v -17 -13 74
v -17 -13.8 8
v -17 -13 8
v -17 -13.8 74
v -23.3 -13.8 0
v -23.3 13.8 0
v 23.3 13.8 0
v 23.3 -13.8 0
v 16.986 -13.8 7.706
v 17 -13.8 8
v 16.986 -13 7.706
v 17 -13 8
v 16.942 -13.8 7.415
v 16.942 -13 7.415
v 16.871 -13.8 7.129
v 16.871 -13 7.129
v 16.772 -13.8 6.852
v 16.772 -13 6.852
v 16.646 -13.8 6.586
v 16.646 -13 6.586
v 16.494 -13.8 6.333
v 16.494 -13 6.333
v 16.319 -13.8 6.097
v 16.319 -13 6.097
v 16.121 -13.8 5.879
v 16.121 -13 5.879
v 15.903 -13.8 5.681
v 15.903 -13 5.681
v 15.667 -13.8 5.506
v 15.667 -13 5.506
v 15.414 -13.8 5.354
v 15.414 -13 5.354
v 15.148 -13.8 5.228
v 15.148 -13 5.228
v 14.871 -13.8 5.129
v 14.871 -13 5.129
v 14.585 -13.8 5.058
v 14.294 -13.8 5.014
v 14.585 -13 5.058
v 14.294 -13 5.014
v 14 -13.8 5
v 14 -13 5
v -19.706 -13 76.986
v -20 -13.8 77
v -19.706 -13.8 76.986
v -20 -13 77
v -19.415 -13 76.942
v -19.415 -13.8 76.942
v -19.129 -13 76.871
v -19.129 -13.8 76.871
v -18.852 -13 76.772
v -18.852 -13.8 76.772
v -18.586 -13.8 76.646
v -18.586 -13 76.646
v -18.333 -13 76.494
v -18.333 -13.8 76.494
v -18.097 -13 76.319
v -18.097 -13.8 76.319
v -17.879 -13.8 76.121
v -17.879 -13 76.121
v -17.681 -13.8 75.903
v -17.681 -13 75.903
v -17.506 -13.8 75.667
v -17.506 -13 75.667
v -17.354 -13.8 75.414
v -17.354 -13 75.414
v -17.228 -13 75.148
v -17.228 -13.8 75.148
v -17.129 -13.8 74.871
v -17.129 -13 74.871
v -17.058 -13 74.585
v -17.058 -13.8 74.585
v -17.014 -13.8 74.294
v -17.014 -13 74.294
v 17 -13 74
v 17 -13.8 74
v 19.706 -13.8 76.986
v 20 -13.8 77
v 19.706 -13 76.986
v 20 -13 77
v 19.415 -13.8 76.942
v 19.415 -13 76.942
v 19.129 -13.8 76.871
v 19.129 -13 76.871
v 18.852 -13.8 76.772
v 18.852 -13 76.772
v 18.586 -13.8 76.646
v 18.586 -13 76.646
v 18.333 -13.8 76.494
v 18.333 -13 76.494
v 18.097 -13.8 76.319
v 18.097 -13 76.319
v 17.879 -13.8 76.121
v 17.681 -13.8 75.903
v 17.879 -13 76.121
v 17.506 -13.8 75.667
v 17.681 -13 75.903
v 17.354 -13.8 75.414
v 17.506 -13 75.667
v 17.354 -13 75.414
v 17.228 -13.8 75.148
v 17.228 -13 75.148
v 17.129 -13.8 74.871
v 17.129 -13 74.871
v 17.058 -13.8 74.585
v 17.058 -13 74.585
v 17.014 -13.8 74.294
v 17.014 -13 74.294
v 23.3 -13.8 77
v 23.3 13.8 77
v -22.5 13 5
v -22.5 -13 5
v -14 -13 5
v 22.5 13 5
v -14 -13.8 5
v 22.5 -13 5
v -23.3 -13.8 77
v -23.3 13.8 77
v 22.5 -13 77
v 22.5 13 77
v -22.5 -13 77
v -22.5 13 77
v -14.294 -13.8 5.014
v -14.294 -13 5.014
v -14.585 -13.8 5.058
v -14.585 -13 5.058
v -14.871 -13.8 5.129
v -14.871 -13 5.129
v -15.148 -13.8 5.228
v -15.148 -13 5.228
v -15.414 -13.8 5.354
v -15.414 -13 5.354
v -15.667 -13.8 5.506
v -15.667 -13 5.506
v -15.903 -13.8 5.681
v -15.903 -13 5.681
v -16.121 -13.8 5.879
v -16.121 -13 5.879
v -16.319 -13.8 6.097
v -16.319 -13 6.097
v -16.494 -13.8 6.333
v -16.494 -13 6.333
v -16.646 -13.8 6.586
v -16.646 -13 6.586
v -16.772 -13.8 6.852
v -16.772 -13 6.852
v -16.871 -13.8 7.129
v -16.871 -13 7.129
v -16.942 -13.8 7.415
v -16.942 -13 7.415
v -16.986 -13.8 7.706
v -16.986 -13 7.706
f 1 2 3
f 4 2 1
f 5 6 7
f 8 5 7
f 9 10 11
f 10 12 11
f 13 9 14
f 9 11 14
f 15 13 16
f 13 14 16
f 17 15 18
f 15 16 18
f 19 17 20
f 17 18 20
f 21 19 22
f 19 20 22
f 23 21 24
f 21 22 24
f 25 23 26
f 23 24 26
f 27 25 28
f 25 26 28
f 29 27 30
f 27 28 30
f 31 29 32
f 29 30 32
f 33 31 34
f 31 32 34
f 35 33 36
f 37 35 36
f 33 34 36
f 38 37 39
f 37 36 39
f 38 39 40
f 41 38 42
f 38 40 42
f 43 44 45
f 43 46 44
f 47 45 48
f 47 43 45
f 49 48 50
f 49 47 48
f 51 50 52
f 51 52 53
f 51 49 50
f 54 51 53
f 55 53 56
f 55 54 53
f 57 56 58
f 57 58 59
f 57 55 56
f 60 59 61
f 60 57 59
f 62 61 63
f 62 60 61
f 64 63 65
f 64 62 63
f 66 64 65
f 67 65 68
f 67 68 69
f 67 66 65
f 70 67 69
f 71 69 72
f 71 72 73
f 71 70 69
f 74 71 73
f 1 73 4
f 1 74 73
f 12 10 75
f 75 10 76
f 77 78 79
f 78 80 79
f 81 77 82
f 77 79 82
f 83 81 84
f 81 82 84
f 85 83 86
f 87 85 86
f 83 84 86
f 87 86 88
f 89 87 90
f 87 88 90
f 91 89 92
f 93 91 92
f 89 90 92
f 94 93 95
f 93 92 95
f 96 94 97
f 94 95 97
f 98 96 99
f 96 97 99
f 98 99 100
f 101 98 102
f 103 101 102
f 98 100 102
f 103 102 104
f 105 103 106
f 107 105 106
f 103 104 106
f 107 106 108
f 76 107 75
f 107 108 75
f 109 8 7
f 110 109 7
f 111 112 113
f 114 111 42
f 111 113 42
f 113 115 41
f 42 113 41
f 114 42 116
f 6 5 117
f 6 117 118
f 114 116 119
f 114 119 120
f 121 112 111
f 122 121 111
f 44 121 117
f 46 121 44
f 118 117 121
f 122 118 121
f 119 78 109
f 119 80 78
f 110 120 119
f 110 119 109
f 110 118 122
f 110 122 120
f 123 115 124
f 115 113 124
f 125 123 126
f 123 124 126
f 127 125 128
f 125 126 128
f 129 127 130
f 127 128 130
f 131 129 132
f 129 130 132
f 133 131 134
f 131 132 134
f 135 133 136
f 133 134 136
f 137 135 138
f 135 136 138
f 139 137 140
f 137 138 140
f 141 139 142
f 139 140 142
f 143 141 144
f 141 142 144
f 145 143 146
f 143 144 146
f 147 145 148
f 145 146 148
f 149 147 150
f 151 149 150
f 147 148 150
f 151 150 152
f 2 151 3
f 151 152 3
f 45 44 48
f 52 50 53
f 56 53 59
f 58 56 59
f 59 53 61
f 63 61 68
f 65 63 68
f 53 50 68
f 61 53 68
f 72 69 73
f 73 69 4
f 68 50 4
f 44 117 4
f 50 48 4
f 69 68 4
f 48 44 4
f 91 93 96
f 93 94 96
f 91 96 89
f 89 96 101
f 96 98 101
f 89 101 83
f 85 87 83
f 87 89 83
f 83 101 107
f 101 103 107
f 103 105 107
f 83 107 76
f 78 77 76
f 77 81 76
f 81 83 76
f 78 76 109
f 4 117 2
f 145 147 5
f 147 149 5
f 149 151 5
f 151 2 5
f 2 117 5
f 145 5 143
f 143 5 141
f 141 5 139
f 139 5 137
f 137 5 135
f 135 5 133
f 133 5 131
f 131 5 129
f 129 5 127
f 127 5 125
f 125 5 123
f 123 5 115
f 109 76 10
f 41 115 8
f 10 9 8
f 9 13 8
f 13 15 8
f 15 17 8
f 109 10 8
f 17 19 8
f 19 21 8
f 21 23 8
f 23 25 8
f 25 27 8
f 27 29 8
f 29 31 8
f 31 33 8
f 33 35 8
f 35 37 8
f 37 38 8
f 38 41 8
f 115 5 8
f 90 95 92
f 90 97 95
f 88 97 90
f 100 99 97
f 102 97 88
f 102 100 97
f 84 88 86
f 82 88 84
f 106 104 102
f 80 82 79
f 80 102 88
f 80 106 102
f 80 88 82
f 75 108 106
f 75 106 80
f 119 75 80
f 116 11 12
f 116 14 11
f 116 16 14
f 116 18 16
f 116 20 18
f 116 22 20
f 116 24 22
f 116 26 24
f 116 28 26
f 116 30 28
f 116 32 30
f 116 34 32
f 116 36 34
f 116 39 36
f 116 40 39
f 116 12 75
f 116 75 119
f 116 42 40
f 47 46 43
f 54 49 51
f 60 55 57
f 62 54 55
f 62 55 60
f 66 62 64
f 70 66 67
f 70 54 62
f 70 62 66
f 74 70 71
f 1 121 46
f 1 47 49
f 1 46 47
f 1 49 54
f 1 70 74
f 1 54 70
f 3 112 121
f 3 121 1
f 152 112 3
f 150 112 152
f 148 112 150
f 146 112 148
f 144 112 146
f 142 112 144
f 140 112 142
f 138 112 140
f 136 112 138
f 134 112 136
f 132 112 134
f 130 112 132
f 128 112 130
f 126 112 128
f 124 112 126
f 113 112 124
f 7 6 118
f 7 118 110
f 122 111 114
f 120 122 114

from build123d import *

# Parameters (mm, degrees)
F0_W     = 46.6
F0_H     = 27.6
F0_W_2   = 45
F0_H_2   = 26
F1_DEPTH = 77
F2_W     = 46.6
F2_H     = 27.6
F3_DEPTH = 5
F4_W     = 34
F4_H     = 72
F5_DEPTH = 0.8
F6_R     = 3


with BuildPart() as f1:
    # F0 (on Top) → F1 (new body)
    with BuildSketch(Plane.XY):
        Rectangle(F0_W, F0_H)
        Rectangle(F0_W_2, F0_H_2, mode=Mode.SUBTRACT)
    extrude(amount=F1_DEPTH)

    # F2 (on face) → F3 (join)
    with BuildSketch(Plane(origin=(0, 0, 0), x_dir=(1, 0, 0), z_dir=(0, 0, -1))):
        Rectangle(F2_W, F2_H)
    extrude(amount=-F3_DEPTH)

    # F4 (on face) → F5 (cut, through all)
    with BuildSketch(Plane.XZ.offset(13.8)):
        with Locations((0, 41)):
            Rectangle(F4_W, F4_H)
    extrude(amount=-F5_DEPTH, mode=Mode.SUBTRACT)

    # F6
    f6_edges = [f1.edges().sort_by_distance(p)[0] for p in [
        (-17, -13.4, 77),
        (17, -13.4, 77),
        (-17, -13.4, 5),
        (17, -13.4, 5),
    ]]
    fillet(f6_edges, radius=F6_R)


solid = f1.part
